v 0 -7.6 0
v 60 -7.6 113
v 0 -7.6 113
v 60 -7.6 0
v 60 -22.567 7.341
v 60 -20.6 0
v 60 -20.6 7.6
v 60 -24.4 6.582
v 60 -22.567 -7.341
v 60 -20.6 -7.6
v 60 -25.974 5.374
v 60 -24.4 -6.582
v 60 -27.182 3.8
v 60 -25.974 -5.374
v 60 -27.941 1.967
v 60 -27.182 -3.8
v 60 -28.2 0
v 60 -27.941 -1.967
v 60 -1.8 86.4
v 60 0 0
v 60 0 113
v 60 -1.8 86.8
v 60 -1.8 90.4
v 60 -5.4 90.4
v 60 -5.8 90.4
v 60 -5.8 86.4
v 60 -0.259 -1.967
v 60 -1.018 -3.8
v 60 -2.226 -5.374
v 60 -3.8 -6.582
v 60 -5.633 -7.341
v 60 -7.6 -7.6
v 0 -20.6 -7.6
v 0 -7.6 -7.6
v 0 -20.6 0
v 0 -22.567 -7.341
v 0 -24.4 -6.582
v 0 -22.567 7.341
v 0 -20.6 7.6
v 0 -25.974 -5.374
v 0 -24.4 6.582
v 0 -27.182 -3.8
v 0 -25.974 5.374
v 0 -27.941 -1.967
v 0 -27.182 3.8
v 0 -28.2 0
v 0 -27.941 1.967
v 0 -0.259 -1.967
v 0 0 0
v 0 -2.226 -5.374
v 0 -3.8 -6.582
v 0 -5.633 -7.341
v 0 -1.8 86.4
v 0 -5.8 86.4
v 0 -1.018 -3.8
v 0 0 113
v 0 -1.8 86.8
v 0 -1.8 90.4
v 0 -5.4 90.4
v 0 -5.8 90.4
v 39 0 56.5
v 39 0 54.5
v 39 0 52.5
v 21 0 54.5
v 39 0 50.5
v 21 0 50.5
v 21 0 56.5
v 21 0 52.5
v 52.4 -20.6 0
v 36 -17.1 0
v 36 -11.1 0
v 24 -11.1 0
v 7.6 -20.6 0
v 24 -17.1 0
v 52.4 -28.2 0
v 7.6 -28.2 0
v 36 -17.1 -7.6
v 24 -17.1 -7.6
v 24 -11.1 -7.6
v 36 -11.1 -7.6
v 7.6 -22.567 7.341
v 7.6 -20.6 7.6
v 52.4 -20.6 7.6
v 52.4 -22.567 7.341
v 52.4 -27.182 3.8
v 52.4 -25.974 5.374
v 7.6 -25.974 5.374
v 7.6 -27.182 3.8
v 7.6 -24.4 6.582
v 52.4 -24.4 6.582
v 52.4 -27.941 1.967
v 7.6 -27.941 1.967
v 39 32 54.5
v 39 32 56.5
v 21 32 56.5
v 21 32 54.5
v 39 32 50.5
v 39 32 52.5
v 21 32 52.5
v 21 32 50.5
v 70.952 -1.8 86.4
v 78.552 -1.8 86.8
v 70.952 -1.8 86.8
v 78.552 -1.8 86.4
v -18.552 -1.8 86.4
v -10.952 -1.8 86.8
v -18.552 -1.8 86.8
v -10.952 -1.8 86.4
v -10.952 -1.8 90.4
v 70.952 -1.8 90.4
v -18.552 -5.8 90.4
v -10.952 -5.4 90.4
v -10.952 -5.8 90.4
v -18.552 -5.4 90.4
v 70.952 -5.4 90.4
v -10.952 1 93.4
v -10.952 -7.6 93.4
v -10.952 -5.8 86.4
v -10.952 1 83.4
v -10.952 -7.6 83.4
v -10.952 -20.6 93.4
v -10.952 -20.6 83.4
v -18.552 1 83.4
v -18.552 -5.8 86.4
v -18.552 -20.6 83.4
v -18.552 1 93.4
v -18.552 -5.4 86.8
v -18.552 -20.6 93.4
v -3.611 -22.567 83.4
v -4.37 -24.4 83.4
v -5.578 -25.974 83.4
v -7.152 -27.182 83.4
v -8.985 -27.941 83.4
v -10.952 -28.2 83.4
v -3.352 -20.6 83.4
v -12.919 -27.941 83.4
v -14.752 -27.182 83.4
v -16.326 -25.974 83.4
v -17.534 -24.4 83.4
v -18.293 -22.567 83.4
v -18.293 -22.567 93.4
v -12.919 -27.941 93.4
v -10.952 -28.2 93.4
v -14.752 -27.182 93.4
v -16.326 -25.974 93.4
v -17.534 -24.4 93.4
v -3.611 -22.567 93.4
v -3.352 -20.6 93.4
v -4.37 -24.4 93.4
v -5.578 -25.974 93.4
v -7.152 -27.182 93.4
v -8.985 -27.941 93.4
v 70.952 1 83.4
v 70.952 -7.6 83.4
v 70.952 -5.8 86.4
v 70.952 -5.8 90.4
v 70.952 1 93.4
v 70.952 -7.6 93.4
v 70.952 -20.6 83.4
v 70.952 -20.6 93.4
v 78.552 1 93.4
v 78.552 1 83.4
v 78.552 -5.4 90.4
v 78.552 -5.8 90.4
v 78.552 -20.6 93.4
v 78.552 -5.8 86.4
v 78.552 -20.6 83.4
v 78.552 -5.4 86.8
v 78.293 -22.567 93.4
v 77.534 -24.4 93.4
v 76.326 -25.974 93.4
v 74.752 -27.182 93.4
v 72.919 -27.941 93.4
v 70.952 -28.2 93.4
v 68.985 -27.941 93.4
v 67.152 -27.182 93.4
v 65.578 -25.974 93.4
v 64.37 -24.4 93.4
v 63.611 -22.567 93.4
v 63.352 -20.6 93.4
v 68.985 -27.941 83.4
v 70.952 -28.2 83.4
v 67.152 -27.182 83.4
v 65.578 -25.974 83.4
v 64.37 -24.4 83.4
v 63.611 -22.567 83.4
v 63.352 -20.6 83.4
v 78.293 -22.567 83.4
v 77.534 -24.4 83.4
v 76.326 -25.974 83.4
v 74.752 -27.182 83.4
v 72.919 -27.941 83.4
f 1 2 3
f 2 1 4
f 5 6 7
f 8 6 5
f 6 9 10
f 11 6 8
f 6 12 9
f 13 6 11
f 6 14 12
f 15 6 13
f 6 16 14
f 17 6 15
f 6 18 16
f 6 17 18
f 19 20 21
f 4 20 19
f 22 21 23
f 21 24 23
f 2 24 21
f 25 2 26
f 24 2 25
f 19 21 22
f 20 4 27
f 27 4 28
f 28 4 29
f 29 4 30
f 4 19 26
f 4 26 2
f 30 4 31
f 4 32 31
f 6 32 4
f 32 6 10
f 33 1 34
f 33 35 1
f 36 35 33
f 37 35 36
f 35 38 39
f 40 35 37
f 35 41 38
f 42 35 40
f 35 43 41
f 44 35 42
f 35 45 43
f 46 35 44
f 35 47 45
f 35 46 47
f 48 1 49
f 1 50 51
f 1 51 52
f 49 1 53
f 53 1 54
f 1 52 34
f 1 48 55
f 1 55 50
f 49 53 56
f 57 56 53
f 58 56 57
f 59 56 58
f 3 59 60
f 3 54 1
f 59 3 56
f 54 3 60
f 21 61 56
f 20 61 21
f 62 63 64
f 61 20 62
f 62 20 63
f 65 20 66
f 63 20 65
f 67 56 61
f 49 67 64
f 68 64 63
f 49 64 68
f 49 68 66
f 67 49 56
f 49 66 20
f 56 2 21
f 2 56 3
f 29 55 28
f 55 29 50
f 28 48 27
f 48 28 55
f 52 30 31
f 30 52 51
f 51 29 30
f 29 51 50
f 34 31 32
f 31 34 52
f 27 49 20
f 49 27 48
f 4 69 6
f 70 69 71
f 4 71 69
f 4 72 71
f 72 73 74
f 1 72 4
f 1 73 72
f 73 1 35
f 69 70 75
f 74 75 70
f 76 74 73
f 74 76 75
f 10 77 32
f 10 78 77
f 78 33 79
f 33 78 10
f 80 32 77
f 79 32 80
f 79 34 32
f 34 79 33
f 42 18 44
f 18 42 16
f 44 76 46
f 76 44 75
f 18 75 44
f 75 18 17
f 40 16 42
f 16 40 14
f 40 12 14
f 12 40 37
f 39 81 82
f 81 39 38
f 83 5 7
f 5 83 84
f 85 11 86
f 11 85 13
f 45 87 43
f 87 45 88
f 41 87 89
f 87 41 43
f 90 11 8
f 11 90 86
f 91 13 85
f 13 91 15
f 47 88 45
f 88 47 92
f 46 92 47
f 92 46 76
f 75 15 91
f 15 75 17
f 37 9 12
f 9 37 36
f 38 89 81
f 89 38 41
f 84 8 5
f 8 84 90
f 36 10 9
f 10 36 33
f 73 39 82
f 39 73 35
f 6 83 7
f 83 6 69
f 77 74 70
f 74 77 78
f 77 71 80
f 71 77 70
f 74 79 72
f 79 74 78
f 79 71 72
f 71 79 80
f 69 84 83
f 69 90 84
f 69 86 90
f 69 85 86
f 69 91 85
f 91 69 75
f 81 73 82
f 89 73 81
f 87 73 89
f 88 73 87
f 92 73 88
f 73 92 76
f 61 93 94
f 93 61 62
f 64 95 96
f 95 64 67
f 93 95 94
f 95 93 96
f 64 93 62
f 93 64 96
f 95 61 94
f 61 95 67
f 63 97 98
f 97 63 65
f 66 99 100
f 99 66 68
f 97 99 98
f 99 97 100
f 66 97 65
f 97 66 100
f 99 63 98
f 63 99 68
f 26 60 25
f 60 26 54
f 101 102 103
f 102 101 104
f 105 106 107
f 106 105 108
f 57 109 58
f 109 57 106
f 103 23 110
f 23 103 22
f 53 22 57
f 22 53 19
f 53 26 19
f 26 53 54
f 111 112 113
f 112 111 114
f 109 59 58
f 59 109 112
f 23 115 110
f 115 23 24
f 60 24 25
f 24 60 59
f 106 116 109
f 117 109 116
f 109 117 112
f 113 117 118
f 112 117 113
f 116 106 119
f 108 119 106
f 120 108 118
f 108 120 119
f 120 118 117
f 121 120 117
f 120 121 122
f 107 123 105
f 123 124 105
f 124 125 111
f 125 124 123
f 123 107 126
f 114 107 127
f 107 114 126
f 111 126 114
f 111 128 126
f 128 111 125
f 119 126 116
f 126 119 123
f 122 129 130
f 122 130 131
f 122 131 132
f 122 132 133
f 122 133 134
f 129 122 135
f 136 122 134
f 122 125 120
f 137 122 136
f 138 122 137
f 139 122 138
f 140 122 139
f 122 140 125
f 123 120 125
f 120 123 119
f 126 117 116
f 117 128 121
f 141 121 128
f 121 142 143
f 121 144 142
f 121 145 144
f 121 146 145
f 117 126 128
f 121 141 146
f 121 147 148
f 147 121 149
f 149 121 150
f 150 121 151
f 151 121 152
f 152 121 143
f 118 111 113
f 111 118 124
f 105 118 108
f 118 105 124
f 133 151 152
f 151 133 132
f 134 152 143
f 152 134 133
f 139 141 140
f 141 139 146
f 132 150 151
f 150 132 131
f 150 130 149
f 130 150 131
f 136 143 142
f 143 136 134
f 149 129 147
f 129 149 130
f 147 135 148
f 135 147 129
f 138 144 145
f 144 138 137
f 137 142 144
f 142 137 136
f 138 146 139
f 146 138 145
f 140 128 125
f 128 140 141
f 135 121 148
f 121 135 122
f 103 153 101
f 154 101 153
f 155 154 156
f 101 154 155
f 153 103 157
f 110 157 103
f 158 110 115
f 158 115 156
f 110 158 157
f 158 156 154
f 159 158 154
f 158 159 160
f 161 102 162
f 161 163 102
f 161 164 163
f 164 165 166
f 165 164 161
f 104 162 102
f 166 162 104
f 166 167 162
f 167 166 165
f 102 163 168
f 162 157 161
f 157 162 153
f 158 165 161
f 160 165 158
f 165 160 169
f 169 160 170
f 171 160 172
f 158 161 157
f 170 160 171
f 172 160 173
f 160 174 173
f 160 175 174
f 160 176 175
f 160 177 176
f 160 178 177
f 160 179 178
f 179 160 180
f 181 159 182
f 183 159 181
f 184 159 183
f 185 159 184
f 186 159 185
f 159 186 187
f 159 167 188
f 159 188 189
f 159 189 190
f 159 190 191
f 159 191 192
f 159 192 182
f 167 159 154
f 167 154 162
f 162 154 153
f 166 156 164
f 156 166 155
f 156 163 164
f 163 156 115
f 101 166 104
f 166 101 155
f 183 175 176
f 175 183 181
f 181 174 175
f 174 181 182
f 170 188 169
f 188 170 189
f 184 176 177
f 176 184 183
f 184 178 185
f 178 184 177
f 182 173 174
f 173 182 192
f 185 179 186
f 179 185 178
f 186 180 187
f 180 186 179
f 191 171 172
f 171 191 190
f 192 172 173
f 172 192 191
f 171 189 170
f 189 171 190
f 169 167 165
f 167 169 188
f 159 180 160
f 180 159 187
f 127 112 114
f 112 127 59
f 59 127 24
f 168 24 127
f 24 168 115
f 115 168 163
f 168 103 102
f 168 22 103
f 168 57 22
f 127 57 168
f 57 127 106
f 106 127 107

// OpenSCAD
//Phone Dimensions
phoneHeight = 150;
phoneWidth = 80;
phoneThickness=13;

//General dimensions
walls=7.6;
width=round(0.75*phoneWidth);
height=round(0.75*phoneHeight);

//Vent dimensions for vehicle
ventSpacing=8;
ventWidth=18;
ventDepth=32;

//Dimensions of the USB hole
USBw = 6;
USBh = 12;

//Support bar location
barLength = (phoneWidth+walls*2)*1.02;
barOffsetx = walls/2-2;
barOffsety = 0.2*height;
barOffsetz = -1*(barLength-width)/2;

//Side support dimensions
sideSupport=10;
supporty = barOffsety+2-sideSupport/2;

// Create the basic shape
module step1() {
    cube([walls,height,width]);
    translate([walls,height,0])
    cylinder(h = width, d=walls*2);
}

// Build the base with curved corners
module step2() {
    difference(){
        step1();
        translate([walls,0,0]) cube([walls,height,width]);
    }
    translate([walls,height,0]) 
    cube([phoneThickness,walls,width]);
    translate([phoneThickness+walls,height,0]) 
    cylinder(h=width,d=walls*2);
}
module step3() {
    difference() {
        step2();
        translate([walls,height-walls,0])
        cube([phoneThickness,walls,width]);
    }
}

// Cut a hole for the USB cord
module step4() {
    holex = walls+(phoneThickness-USBw)/2;
    holey = (width-USBh)/2;
    difference() {
        step3();
        translate([holex,height,holey])
        cube([USBw,walls,USBh]);       
    }
}

// Cut a hole for front controls
module step5() {
    difference() {
        step4();
        translate([walls+phoneThickness,height-walls,walls])
        cube([walls,walls,width-walls*2]);        
    }
    //Add vent mounts
    translate([-1*ventDepth,0.5*height,(width-ventWidth)/2])
    cube([ventDepth,2,ventWidth]);
    translate([-1*ventDepth,0.5*height+ventSpacing-4,(width-ventWidth)/2])
    cube([ventDepth,2,ventWidth]);
}


//Cut hole for side supports
//Main holder body is now complete
module step6() {
    difference() {
        step5();
        translate([walls/2-2,0.2*height,0])
        cube([4,4,width]);
    }
}

module body() {
    step6();
}

//Rectangular support bar to print
//Slightly smaller to accomodate printing tolerance
module supportBar() {
    translate([barOffsetx,barOffsety,barOffsetz])
    cube([3.6,3.6,barLength]);
}

// Use a 4x4 bar to bore the appropriate holes
module supportBar4x4() {
    translate([barOffsetx,barOffsety,barOffsetz])
    cube([4,4,barLength]);
}

//Basic shape for side support
module step7() {
    translate([-1,supporty,barOffsetz])
    cube([phoneThickness+walls+1,sideSupport,walls]);   
}

module step8() {
    difference() {
        step7();
        supportBar4x4();
    }
    translate([walls+phoneThickness,supporty+sideSupport,barOffsetz+walls])
    rotate(a=[90,0,0])
    cylinder(h = sideSupport, d=walls*2); 
}

module step9() {
    difference() {
        step8();
        thisX = walls;
        thisY = supporty;
        thisZ = barOffsetz+walls;
        translate([thisX,thisY,thisZ])
        cube([phoneThickness,sideSupport,walls]); 
    }
}

module supportLeft() {
    step9();
}

module supportRight() {
    thisX = 0*(walls+phoneThickness);
    thisY = -2*supporty-sideSupport;
    thisZ = -1*barLength-2*barOffsetz;
    rotate(a=[180,0,0])
    translate([thisX,thisY,thisZ])
    supportLeft();
}

//See all at once
module onePiece() {
    translate([0,0,height])
    rotate(a=[90,180,90])
    union() {
        body();
        supportBar();
        supportLeft();
        supportRight();
    }
}
//Comment out this line to enable printing one part at a time.
onePiece();

//Un-Comment these out to print each part separately
//body();
//supportBar();
//supportLeft();
//supportRight();
